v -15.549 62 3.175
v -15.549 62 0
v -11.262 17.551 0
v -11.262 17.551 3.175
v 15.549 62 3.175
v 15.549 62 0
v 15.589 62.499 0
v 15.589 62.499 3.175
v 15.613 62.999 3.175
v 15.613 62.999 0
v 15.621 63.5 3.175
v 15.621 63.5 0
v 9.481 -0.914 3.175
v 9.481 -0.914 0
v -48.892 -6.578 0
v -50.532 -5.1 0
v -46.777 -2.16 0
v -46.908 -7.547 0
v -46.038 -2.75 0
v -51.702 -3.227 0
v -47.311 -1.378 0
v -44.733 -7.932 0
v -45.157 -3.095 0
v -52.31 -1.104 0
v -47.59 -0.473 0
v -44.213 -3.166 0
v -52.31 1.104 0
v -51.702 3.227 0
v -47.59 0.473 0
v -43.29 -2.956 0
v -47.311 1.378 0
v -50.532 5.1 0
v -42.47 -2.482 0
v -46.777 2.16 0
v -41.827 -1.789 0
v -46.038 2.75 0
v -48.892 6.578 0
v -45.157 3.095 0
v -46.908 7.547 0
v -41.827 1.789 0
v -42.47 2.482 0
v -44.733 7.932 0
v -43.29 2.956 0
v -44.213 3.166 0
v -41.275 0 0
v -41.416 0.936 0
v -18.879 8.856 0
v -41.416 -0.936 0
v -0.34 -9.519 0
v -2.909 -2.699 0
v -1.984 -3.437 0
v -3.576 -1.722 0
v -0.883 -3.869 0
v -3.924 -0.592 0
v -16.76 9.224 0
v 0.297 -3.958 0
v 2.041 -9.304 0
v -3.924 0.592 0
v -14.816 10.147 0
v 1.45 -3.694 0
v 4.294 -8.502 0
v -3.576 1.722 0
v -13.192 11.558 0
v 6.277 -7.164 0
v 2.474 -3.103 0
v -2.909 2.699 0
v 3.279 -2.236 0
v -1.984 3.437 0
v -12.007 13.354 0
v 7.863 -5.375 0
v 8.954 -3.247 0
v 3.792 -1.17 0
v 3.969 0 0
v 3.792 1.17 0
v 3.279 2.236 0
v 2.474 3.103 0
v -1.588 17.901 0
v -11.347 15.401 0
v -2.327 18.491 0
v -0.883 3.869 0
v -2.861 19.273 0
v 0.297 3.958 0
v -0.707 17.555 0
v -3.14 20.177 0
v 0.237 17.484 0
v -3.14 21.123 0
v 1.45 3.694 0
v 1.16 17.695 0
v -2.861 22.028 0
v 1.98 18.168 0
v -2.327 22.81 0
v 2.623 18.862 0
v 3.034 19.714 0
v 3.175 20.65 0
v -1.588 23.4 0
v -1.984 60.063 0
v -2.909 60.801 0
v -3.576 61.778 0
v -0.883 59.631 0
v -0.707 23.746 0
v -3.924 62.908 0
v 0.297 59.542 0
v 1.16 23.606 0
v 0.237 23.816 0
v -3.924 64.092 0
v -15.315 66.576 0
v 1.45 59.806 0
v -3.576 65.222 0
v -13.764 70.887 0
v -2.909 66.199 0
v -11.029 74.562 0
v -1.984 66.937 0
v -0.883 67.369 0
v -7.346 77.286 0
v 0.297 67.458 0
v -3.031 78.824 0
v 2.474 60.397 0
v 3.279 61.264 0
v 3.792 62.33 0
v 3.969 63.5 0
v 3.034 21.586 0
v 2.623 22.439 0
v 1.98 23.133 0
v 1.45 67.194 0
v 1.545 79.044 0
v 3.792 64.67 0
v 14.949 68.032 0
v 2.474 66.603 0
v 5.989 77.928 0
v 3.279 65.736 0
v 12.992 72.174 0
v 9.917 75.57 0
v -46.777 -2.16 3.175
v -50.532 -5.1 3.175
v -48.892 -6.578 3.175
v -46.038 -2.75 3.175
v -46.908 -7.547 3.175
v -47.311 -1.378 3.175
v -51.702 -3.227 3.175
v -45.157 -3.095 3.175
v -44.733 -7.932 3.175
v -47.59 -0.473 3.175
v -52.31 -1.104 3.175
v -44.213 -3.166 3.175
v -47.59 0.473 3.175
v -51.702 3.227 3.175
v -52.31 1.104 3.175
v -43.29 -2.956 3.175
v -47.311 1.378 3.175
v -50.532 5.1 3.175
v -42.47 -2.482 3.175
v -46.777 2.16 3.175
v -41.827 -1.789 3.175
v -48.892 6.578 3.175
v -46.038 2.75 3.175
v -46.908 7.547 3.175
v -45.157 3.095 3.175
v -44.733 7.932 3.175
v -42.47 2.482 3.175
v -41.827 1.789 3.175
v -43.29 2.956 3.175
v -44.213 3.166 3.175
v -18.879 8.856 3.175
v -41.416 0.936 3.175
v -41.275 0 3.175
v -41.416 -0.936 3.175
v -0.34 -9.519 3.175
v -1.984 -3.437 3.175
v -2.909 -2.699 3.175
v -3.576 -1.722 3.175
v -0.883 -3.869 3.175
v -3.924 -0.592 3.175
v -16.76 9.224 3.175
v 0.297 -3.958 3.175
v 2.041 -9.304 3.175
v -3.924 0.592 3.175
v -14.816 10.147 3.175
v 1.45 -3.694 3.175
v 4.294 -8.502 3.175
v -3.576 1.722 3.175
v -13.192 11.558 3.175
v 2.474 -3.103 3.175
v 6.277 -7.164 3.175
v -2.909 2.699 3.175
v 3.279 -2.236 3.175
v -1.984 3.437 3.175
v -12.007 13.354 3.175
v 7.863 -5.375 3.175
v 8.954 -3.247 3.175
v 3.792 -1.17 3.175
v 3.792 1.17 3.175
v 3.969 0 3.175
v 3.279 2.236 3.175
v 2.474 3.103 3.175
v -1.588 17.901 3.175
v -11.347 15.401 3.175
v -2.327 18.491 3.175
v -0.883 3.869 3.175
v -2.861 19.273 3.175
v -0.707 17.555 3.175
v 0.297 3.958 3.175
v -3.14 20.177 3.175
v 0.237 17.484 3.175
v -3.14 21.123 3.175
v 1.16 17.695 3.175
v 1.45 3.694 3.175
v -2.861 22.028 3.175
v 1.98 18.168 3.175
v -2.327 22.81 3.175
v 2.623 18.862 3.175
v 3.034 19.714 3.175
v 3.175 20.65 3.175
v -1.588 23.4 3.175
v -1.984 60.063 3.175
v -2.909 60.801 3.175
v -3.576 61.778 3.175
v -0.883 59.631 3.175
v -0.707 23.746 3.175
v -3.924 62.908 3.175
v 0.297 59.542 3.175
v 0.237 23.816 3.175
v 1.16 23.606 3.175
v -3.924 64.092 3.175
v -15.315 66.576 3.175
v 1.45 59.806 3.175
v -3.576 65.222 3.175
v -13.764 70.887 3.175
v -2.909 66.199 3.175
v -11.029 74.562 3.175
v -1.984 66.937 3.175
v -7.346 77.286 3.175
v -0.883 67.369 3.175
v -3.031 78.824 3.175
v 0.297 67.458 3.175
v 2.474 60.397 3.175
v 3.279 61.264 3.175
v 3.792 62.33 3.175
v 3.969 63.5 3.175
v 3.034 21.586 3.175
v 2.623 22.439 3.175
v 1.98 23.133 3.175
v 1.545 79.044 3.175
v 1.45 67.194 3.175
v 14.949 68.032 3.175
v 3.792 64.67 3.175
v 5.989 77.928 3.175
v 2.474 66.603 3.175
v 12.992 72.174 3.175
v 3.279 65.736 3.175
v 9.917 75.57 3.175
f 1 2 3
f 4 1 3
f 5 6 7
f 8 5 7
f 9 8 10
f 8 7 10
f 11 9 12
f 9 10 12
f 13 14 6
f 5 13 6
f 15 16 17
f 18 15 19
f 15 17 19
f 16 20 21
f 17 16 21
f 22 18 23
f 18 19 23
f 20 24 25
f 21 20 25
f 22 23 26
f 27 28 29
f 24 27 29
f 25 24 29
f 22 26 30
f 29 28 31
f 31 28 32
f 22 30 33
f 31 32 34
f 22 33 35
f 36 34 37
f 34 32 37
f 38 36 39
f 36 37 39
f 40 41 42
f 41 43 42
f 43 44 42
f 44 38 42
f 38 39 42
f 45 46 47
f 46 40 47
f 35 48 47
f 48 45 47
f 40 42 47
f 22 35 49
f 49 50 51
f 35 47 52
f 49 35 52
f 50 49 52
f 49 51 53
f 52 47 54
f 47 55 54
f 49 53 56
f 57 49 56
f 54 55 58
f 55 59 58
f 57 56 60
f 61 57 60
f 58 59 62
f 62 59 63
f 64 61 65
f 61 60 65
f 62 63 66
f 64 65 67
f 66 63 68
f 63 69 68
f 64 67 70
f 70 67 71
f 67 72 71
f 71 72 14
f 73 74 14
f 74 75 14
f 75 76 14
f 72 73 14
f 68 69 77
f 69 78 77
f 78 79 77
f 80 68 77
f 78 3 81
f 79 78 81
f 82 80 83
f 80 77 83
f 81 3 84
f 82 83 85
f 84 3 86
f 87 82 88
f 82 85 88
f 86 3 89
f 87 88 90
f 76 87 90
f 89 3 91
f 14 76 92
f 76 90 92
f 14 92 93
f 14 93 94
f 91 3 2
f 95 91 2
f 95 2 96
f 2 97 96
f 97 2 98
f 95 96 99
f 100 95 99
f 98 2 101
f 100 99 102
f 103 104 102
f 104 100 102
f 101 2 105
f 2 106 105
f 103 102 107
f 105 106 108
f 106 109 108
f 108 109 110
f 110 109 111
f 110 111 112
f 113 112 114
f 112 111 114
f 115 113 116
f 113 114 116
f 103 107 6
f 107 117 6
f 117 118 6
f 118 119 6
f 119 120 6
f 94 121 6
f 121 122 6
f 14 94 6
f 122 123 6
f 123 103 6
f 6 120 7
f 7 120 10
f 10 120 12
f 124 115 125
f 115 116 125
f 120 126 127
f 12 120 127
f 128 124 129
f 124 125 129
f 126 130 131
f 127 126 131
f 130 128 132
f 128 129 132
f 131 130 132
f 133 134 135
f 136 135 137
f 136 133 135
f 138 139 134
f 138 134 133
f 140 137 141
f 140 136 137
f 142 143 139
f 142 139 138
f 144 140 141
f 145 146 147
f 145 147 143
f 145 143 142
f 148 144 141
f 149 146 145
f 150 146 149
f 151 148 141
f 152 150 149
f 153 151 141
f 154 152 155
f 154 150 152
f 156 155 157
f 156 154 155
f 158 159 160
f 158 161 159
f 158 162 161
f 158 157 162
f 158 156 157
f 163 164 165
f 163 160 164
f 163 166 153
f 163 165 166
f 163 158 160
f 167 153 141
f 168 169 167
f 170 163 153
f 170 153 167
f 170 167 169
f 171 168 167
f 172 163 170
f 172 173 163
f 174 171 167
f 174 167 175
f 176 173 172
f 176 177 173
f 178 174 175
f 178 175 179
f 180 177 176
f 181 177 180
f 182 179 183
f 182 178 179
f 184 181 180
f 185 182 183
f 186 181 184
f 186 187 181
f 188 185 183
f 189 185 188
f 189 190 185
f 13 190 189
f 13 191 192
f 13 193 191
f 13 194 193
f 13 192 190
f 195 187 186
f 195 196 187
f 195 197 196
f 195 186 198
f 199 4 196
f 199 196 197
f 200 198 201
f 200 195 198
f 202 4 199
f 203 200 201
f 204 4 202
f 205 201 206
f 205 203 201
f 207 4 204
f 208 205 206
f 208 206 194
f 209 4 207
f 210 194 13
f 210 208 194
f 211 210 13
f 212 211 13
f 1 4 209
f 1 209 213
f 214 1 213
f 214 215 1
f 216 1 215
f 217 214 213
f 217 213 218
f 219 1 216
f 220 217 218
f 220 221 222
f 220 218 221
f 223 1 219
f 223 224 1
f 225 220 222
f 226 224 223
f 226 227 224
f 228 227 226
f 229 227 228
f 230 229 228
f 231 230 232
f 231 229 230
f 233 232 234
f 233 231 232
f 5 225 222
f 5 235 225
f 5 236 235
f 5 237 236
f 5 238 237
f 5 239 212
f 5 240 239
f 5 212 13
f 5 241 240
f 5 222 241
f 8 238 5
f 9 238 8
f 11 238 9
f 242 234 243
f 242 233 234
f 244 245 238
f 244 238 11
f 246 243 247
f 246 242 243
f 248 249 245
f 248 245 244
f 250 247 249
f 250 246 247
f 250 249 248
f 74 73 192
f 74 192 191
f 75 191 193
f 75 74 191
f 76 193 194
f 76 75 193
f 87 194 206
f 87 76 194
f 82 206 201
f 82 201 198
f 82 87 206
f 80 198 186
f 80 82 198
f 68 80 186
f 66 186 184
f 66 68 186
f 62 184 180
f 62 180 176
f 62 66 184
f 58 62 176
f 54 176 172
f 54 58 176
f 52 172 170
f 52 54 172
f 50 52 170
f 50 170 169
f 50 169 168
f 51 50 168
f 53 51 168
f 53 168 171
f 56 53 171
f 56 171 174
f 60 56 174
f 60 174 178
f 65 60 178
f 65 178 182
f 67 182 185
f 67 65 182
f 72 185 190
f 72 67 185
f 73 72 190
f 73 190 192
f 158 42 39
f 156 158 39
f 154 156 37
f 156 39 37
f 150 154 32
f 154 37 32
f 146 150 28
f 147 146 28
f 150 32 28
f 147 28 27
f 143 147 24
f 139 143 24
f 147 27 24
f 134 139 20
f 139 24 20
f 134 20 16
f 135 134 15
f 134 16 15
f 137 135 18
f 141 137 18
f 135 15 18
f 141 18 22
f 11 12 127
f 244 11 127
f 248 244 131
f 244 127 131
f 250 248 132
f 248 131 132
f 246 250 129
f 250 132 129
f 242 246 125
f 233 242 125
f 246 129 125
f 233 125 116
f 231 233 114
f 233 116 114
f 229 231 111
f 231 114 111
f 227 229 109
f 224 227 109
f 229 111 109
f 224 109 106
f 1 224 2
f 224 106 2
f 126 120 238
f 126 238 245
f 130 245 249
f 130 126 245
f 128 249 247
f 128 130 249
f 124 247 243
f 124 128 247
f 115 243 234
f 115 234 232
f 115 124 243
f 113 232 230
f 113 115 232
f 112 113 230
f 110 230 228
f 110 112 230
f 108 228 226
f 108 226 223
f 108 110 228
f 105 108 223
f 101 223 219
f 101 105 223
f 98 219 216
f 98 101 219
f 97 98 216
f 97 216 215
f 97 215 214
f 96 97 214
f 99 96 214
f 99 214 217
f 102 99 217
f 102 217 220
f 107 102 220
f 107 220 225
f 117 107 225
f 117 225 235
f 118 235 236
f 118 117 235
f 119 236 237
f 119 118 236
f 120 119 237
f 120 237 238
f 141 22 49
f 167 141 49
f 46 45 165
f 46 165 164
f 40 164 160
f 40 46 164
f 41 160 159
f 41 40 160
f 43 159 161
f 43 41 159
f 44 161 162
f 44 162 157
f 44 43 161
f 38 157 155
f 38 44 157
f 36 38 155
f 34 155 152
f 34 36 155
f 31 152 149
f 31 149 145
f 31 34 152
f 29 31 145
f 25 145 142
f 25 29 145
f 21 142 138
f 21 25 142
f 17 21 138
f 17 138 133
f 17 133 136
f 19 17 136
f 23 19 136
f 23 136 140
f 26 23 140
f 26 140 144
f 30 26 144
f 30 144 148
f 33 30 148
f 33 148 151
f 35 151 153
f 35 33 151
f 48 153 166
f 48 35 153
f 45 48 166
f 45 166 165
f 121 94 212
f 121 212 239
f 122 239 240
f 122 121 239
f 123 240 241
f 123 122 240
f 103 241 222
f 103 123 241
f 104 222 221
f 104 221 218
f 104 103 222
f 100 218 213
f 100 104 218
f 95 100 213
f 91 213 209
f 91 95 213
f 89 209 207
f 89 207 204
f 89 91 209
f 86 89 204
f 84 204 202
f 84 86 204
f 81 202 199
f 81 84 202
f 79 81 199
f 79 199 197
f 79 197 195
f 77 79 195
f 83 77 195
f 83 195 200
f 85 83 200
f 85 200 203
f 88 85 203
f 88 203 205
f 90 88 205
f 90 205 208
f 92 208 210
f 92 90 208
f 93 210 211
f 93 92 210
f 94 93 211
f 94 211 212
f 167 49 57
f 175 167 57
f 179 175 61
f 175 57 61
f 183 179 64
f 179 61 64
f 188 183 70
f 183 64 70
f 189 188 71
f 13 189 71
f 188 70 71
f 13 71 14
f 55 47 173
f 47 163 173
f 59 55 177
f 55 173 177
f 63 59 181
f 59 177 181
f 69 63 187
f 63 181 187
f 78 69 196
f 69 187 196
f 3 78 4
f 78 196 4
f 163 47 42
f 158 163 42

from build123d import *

# Parameters (mm, degrees)
F0_R     = 3.175
F0_R_2   = 3.96875
F1_DEPTH = 3.175
F2_R     = 7.9375


with BuildPart() as f1:
    # F0 (on Top) → F1 (new body)
    with BuildSketch(Plane.XY):
        with BuildLine():
            ThreePointArc((-44.7334821429, -7.9324362036), (-38.9384772185, -5.7120069047), (-36.5125, 0))
            ThreePointArc((-36.5125, 0), (-38.9384772185, 5.7120069047), (-44.7334821429, 7.9324362036))
            ThreePointArc((-44.7334821429, 7.9324362036), (-52.3875, 0), (-44.7334821429, -7.9324362036))
        make_face()
        with Locations((-44.45, 0)):
            Circle(F0_R, mode=Mode.SUBTRACT)
        with BuildLine():
            ThreePointArc((-44.7334821429, 7.9324362036), (-38.9384772185, 5.7120069047), (-36.5125, 0))
            ThreePointArc((-36.5125, 0), (-38.9384772185, -5.7120069047), (-44.7334821429, -7.9324362036))
            Line((-44.7334821429, -7.9324362036), (-0.3401785714, -9.5189234444))
            ThreePointArc((-0.3401785714, -9.5189234444), (-6.5286582423, -6.9355783144), (-9.481007206, -0.9144))
            Line((-9.481007206, -0.9144), (-10.4524001899, 9.157542126))
            Line((-10.4524001899, 9.157542126), (-44.7334821429, 7.9324362036))
        make_face()
        with BuildLine():
            Line((-0.3401786498, 9.5189234416), (-10.4524001899, 9.157542126))
            Line((-10.4524001899, 9.157542126), (-9.481007206, -0.9144))
            ThreePointArc((-9.481007206, -0.9144), (-7.1643200942, 6.2767939736), (-0.3401786498, 9.5189234416))
        make_face()
        with BuildLine():
            Line((-15.5488518178, 62.000384), (-10.4524001899, 9.157542126))
            Line((-10.4524001899, 9.157542126), (-0.3401786498, 9.5189234416))
            ThreePointArc((-0.3401786498, 9.5189234416), (6.6138273095, 6.8544083129), (9.525, 0))
            ThreePointArc((9.525, 0), (9.5139954445, -0.4577288296), (9.481007206, -0.9144))
            Line((9.481007206, -0.9144), (15.5488518178, 62.000384))
            ThreePointArc((15.5488518178, 62.000384), (0, 47.879), (-15.5488518178, 62.000384))
        make_face()
        with Locations((0, 20.6502)):
            Circle(F0_R, mode=Mode.SUBTRACT)
        with BuildLine():
            ThreePointArc((-9.481007206, -0.9144), (-6.5286582423, -6.9355783144), (-0.3401785714, -9.5189234444))
            ThreePointArc((-0.3401785714, -9.5189234444), (6.2767940031, -7.1643200684), (9.481007206, -0.9144))
            ThreePointArc((9.481007206, -0.9144), (9.5139954445, -0.4577288296), (9.525, 0))
            ThreePointArc((9.525, 0), (6.6138273095, 6.8544083129), (-0.3401786498, 9.5189234416))
            ThreePointArc((-0.3401786498, 9.5189234416), (-7.1643200942, 6.2767939736), (-9.481007206, -0.9144))
        make_face()
        Circle(F0_R_2, mode=Mode.SUBTRACT)
        with BuildLine():
            ThreePointArc((15.621, 63.5), (-0.7506752806, 79.102952529), (-15.5488518178, 62.000384))
            ThreePointArc((-15.5488518178, 62.000384), (0, 47.879), (15.5488518178, 62.000384))
            ThreePointArc((15.5488518178, 62.000384), (15.602952529, 62.7493247194), (15.621, 63.5))
        make_face()
        with Locations((0, 63.5)):
            Circle(F0_R_2, mode=Mode.SUBTRACT)
    extrude(amount=F1_DEPTH)

    # F2
    f2_edges = [f1.edges().sort_by_distance(p)[0] for p in [
        (-10.4524, 9.157542, 1.5875),
    ]]
    fillet(f2_edges, radius=F2_R)


solid = f1.part
